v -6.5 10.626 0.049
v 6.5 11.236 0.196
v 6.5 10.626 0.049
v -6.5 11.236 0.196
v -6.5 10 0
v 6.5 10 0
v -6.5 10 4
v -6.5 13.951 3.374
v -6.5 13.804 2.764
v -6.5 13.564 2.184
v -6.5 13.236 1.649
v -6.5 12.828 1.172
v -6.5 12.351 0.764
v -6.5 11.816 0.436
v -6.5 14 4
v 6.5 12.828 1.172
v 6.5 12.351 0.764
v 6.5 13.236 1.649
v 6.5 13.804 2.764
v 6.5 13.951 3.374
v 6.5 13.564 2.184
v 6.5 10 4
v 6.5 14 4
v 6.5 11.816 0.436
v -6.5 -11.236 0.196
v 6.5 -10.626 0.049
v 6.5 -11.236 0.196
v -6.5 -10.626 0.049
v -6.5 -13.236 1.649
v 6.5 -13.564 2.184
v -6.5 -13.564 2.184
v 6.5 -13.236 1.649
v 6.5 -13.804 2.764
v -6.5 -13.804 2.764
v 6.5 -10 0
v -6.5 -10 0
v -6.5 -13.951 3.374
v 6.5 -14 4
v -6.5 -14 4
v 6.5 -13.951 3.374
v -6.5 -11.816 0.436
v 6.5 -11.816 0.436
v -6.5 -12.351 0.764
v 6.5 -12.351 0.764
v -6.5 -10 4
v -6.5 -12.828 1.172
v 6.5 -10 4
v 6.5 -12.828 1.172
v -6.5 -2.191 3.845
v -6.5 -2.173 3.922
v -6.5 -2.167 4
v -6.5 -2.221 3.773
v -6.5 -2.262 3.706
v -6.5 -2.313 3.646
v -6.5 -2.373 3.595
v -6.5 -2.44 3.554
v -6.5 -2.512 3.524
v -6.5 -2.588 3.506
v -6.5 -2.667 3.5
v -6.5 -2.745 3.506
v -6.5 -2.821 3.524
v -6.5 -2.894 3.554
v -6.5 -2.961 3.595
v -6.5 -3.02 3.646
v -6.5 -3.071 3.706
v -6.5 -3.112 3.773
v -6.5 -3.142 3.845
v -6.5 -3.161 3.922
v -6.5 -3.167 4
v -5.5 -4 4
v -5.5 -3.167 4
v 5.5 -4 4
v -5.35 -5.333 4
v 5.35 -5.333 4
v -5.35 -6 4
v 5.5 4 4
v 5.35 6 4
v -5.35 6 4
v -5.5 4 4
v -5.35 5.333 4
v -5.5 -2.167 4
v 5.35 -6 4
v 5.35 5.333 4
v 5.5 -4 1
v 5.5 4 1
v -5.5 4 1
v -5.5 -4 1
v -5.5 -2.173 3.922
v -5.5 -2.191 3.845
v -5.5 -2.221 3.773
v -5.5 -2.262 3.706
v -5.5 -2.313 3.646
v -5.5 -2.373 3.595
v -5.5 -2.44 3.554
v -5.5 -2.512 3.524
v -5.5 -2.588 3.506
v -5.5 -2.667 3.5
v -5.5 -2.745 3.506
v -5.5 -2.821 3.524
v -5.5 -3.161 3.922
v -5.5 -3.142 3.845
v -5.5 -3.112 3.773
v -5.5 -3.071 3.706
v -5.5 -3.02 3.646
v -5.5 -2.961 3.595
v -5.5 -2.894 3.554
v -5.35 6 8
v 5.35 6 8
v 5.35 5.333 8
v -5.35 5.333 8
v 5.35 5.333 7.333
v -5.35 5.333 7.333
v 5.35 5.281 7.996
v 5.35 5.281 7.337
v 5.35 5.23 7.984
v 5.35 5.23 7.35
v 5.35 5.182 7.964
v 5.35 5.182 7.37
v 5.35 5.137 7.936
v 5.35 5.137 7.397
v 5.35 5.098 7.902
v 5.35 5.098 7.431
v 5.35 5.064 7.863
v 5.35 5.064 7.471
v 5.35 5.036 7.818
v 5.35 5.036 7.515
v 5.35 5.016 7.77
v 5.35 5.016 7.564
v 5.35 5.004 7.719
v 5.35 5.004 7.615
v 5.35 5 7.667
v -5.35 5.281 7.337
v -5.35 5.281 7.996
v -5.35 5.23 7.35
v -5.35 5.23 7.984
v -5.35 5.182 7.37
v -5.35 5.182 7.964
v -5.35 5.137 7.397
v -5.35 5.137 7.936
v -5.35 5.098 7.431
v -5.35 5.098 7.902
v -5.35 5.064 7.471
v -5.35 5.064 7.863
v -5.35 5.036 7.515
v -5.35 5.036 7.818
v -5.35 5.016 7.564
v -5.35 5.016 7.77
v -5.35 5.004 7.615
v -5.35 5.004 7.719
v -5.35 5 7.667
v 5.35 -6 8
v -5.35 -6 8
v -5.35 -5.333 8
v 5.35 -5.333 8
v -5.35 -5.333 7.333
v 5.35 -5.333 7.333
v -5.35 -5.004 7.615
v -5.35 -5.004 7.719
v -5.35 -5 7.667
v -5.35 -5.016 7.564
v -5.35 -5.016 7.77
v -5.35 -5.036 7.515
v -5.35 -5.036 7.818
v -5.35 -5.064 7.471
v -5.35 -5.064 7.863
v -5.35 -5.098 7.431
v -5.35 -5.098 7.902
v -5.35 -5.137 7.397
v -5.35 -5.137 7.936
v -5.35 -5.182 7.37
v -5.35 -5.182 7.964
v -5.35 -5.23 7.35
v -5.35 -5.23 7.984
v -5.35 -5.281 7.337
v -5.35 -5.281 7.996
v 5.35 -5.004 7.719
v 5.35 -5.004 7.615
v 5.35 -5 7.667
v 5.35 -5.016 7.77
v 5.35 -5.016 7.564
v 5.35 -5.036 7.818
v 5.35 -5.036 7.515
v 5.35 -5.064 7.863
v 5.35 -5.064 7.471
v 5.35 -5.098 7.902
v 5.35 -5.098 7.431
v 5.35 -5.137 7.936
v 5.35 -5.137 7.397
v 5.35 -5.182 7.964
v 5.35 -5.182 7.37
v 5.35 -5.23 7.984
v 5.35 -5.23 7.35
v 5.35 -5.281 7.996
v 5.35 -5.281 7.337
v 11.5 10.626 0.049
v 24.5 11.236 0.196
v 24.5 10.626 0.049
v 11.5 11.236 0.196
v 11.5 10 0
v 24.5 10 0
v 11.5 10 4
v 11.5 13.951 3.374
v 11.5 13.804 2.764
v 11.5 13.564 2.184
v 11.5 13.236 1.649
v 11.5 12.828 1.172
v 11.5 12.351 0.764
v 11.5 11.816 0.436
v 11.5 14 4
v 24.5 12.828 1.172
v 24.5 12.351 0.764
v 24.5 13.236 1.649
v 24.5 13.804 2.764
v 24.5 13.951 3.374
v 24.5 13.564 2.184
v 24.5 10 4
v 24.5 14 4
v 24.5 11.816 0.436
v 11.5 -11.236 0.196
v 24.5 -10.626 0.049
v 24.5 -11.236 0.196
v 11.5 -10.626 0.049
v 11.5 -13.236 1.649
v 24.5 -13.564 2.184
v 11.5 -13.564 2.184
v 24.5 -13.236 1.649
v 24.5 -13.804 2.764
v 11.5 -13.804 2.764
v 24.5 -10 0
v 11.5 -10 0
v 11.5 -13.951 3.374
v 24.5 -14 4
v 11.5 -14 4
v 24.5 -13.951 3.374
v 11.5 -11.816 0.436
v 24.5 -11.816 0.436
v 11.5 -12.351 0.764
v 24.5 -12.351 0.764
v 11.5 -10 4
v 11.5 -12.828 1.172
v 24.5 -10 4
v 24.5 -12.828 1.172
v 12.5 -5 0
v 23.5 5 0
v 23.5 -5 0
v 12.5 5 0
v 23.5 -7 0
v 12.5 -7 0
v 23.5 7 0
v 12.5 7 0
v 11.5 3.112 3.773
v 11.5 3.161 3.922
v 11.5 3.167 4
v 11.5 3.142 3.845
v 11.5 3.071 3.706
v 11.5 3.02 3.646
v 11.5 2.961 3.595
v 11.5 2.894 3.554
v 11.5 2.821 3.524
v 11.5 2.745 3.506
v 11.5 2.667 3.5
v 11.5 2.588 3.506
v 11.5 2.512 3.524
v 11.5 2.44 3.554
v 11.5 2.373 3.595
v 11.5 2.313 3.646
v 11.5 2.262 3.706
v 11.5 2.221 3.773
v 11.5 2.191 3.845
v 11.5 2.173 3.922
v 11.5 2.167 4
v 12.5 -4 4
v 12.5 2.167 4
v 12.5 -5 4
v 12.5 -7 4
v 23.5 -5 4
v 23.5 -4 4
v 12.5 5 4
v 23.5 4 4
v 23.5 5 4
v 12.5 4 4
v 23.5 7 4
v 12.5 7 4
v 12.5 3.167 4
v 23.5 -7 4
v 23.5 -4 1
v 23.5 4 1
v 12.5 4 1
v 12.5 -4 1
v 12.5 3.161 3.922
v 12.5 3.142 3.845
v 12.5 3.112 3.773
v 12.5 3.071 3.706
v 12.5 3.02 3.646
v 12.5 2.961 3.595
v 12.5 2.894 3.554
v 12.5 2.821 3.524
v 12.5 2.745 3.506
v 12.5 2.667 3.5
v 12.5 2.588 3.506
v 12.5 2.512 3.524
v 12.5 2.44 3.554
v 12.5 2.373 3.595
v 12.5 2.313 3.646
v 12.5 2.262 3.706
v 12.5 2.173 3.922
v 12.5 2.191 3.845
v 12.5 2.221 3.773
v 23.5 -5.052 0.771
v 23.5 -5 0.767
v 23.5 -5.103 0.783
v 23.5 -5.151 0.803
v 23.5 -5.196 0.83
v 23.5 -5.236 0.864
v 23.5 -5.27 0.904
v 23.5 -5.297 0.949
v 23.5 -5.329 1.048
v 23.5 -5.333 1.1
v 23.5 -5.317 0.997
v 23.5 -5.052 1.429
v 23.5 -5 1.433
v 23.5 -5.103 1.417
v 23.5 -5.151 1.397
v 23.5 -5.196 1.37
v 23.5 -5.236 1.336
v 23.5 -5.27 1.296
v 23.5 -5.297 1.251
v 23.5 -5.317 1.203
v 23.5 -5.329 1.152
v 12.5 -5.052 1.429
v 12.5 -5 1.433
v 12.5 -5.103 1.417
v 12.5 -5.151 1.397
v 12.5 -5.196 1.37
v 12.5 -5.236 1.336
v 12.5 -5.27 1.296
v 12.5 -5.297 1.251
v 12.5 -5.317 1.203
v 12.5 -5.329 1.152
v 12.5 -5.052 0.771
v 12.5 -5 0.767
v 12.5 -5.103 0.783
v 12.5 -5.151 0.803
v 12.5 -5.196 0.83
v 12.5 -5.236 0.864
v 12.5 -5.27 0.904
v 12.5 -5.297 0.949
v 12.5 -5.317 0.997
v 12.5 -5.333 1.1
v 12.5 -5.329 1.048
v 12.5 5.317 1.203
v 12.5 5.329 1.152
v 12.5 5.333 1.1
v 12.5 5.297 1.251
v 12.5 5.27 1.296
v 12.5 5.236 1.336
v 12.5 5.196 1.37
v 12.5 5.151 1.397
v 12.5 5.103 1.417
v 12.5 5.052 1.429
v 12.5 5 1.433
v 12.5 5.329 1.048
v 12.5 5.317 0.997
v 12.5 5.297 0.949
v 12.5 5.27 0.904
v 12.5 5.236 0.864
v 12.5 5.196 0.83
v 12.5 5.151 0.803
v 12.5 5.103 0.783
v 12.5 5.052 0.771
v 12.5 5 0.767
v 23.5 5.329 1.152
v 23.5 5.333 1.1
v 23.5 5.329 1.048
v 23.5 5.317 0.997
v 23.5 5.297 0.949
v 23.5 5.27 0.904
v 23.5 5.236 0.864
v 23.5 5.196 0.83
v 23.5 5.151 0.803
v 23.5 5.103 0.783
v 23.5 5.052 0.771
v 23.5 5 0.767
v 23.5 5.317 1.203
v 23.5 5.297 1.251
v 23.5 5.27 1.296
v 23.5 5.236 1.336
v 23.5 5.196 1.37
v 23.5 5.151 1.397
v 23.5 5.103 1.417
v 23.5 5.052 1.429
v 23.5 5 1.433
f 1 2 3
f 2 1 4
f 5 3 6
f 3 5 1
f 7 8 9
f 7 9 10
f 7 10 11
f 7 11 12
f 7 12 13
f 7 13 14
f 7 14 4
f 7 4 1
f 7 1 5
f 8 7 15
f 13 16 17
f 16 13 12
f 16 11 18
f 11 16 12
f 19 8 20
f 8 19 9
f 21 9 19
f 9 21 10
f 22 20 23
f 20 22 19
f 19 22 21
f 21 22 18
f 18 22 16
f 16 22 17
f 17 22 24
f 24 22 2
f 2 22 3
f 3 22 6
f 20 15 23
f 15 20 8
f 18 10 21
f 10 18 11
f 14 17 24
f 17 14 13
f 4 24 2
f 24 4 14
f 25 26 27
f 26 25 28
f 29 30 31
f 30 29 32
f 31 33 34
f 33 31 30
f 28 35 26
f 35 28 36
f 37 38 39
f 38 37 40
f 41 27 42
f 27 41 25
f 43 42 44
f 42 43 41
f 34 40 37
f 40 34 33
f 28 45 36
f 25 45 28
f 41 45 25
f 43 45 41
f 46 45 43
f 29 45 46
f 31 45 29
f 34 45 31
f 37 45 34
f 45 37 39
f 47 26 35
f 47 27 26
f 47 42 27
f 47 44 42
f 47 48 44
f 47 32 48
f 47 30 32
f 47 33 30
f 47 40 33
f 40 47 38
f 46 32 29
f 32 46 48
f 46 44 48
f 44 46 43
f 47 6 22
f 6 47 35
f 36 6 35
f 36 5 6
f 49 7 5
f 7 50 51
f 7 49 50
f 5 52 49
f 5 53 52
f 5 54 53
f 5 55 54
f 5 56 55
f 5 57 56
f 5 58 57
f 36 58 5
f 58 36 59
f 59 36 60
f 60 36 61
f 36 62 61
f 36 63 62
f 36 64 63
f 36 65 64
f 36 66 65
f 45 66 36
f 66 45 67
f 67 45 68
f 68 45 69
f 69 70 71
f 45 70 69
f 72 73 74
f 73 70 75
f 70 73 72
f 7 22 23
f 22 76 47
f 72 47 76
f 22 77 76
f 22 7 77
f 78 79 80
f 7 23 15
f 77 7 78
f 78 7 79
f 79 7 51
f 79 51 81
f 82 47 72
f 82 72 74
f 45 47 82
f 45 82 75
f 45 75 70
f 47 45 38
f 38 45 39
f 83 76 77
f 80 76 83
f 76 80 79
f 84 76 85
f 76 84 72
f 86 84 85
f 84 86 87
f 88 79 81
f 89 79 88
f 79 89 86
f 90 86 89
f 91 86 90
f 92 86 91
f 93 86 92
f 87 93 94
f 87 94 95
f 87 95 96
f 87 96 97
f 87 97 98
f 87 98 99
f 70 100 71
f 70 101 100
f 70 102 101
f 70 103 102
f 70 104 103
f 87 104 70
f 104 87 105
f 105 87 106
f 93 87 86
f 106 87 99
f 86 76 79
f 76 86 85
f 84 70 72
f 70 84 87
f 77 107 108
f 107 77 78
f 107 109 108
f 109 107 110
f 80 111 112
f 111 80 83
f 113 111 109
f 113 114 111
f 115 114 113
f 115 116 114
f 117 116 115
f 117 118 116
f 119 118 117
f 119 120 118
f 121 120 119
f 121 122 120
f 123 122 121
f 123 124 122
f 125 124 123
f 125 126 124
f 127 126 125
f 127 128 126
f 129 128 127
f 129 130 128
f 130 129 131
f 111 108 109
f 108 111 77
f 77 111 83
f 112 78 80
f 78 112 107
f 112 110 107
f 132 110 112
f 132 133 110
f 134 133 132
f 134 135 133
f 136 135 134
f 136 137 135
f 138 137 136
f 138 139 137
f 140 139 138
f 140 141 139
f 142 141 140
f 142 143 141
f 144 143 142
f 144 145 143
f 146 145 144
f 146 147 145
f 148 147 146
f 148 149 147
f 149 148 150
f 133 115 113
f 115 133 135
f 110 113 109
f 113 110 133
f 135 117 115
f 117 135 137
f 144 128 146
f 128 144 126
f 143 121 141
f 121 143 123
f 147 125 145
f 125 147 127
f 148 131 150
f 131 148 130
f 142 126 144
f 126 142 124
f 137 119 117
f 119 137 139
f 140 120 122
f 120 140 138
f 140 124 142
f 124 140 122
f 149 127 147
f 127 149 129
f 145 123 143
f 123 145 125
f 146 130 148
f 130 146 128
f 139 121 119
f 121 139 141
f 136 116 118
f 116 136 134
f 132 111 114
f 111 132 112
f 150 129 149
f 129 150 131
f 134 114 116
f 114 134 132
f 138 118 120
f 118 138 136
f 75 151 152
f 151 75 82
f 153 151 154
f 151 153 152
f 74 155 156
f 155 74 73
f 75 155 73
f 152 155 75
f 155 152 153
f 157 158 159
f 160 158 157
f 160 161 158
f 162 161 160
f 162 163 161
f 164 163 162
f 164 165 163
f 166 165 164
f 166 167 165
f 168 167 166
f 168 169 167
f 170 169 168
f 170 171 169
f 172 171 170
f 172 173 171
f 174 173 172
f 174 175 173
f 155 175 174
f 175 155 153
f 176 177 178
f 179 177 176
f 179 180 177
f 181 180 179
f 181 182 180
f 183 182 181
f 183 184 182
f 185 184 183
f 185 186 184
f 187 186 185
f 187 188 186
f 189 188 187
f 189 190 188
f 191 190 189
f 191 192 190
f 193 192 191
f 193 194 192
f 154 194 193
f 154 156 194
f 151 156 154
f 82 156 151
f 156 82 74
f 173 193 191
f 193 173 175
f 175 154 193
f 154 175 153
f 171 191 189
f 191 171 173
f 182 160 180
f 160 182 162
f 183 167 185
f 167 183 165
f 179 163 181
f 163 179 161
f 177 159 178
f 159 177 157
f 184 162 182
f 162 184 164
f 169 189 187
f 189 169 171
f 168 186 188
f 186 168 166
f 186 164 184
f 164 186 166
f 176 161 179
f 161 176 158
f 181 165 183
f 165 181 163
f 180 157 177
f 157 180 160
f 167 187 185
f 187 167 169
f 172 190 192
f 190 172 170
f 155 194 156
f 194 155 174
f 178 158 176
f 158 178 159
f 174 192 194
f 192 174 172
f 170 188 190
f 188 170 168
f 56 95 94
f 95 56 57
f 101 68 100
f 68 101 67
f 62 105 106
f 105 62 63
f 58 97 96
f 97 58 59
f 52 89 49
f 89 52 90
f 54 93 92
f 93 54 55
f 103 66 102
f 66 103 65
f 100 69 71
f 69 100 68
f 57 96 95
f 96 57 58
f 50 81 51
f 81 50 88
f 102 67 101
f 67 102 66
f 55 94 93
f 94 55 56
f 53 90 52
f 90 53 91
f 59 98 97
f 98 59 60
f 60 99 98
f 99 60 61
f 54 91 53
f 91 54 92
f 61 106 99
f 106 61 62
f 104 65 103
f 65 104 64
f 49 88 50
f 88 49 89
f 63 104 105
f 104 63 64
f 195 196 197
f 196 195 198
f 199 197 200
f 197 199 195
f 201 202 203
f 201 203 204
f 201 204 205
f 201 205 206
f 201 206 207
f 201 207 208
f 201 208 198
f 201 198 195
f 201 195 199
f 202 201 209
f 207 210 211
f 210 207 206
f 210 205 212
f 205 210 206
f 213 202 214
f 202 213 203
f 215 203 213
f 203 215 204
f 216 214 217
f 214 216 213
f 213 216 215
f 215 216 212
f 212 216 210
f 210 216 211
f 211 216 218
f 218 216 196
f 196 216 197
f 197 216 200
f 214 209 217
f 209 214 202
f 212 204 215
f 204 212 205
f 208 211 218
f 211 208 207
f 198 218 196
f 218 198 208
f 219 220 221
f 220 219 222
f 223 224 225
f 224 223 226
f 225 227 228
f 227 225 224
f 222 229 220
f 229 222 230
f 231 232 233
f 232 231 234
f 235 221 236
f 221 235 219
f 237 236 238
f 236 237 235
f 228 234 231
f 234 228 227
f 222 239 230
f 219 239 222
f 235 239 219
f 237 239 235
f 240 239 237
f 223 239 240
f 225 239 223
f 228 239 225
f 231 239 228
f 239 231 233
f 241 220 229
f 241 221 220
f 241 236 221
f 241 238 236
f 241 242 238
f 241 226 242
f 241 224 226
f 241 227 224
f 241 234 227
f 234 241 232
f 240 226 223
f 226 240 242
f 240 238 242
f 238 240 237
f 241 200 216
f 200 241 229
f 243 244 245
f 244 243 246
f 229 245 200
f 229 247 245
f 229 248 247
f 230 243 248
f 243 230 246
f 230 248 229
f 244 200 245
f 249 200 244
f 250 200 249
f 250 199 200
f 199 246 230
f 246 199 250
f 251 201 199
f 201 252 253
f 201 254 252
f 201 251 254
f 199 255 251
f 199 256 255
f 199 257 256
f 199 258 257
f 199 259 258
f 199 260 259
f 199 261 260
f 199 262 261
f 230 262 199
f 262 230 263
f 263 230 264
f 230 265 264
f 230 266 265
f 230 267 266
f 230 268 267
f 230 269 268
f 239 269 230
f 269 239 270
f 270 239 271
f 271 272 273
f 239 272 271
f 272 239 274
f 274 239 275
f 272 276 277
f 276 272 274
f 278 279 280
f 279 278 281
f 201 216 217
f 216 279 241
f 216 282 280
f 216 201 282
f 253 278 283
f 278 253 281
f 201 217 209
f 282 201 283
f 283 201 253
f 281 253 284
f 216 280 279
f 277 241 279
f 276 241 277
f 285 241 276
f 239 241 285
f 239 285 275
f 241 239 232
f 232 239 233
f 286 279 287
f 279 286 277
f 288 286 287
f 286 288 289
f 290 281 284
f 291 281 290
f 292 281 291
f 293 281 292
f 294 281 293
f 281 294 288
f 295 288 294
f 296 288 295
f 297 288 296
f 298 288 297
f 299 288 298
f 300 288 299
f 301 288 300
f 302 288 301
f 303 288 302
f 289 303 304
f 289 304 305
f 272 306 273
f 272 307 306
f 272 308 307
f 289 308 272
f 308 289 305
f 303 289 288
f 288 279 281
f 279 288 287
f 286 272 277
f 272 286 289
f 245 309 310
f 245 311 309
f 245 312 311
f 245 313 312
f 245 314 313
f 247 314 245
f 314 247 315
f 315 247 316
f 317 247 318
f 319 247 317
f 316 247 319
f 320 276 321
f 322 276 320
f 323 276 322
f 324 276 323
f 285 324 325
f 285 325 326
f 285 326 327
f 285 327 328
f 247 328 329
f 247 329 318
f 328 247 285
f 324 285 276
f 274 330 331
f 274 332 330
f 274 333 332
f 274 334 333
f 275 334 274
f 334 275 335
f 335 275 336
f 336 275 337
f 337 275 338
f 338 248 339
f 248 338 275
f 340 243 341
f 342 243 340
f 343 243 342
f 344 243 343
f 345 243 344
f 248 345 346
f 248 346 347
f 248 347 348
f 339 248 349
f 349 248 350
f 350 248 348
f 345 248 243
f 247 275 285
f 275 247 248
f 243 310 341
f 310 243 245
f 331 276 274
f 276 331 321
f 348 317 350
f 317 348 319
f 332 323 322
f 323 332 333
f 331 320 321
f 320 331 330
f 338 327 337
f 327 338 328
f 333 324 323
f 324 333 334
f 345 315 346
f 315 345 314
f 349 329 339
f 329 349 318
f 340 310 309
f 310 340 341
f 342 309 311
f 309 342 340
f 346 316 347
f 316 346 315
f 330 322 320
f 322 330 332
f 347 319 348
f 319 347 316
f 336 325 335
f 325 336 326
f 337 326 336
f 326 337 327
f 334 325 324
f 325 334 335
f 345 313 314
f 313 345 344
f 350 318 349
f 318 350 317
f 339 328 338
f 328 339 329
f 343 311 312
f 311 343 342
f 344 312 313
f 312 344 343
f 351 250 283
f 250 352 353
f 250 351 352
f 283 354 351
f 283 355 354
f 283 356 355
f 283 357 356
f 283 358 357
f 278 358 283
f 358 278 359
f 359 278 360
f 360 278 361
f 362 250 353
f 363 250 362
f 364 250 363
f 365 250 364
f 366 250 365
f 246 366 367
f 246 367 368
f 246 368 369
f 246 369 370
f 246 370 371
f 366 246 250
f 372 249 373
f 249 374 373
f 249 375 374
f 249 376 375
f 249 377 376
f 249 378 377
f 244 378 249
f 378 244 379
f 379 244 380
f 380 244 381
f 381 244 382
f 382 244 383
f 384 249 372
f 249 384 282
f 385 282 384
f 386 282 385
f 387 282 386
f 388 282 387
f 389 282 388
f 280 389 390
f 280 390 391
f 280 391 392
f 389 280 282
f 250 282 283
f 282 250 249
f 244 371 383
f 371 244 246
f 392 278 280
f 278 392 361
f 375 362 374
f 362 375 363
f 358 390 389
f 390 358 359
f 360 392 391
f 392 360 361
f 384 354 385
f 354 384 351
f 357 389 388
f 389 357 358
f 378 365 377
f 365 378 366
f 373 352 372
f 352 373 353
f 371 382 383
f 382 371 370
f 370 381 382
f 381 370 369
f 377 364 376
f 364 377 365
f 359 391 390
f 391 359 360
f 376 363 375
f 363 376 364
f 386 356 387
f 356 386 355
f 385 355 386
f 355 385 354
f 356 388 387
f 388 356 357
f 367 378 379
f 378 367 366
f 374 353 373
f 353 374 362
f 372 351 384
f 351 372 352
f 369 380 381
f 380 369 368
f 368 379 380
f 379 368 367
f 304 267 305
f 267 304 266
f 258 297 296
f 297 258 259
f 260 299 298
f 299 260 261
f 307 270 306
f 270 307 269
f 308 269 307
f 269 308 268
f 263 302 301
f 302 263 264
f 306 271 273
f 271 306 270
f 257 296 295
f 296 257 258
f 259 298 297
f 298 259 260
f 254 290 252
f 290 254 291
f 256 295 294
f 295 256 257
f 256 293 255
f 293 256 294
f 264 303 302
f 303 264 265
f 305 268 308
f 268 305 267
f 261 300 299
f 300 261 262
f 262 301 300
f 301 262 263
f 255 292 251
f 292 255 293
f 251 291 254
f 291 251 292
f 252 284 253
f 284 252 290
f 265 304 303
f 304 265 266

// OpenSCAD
//alles in mm
//spezifikationen des Bauteils
r_durchmesser = 5;
r_laenge = 10;
r_kasten_breite = 2;

Kabel_durchmesser = 1;


// Wandstärken 
wand_laenge = 1; //mindestens 1
b_ueberlappung = 3; //ueberlappung mit Stoff + ges_hoehe/2 mindestens 1
wand_breite = 1; //mindestens 1
wand_hoehe = 1; //mindestens 1

//offsets
clipper = 2; //mindestens/empfohlen 2

clipper_offset = 0.3;//reibungsvermeidung (innenteil kleiner)

stoff_spielraum = 0.1;// Spielraum der clipper um die stoffdicke zu kompensieren

clipper_staerke = clipper/3;
//diese offsets sind fuer zusaetzlichen platz im innenraum

off_breite = 0.5; //empfohlen groeßer 0,25
off_laenge = 0.5; //empfohlen groeßer 0,25
off_hoehe = 0.5; //empfohlen groeßer 0,25

//errechnete groeßen
bauteil_breite = r_durchmesser + r_kasten_breite;

//gesamtmaße des Quaders ohne runde Ecken
ges_laenge = r_laenge + 2*wand_laenge + 2*off_laenge;

ges_breite = 2*b_ueberlappung + 2*clipper + 2*wand_breite+bauteil_breite + 2 * off_laenge;

ges_hoehe = 2*wand_hoehe + r_durchmesser+2*off_hoehe;

//maße des inneren quaders
in_breite = bauteil_breite + 2 *off_breite;
in_laenge = r_laenge +2*off_laenge;
in_hoehe = r_durchmesser+2*off_hoehe;


//halbgrößen
h_halb = ges_hoehe/2;
l_halb = ges_laenge/2;
b_halb = ges_breite/2;

h_in_halb = in_hoehe/2;
l_in_halb = in_laenge/2;
b_in_halb = in_breite/2;

complete();


module complete()
{

    translate([0,0,h_halb])
    {
        lowerhalf();
    }

    translate([ges_laenge + 5  ,0,h_halb])
    {
        upperhalf();
    }
}

module test()
{
    difference()
    {
        union()
        {
            rotate([0,180,180])
            {
                upperhalf();

            }
            lowerhalf();
            }  
        translate([-l_halb,0,0])
        {
        cube([ges_laenge,ges_breite+ges_hoehe+1,ges_hoehe+1],center=true); 
        }
    }
}
 
module lowerhalf()
{
    difference(){
    union()
    {
        half();
        translate([0,b_in_halb+wand_breite+h_halb/12,0])
        {
            translate([-(in_laenge-clipper_offset)/2,0,h_halb])
            {
                rotate([0,180,-90])
                {
                    union()
                    {
                        cube([clipper_staerke,in_laenge-clipper_offset,h_halb]);
                        translate([0,0,h_halb/12])
                        {
                            rotate([-90,90,0])
                            {  
                                cylinder(h = in_laenge-clipper_offset,d = h_halb/6,$fn=40);
                            }
                        }
                    }
                    
                }
            }
        }
        translate([0,-b_in_halb-wand_breite-h_halb/12,0])
        {
            translate([(in_laenge-clipper_offset)/2,0,h_halb])
            {
                rotate([0,180,90])
                {
                    union()
                    {
                        cube([clipper_staerke,in_laenge-clipper_offset,h_halb]);
                        translate([0,0,h_halb/12])
                        {
                            rotate([-90,90,0])
                            {  
                                cylinder(h = in_laenge-clipper_offset,d = h_halb/6,$fn=40);
                            }
                        }
                    }
                    
                }
            }
        }
    } 
    translate([-l_in_halb-wand_laenge/2,-in_breite/3,0])
        {
            rotate([0,90,0])
            {    
            
                cylinder(h = wand_laenge * 2  ,r = Kabel_durchmesser/2,$fn=40,center=               true);
            
            
            } 
        } 
}}    


module upperhalf()
{
    difference()
    {
        half();
        
        
        translate([-l_in_halb,clipper/2,0])//zentrierung
        {
            translate([0,-clipper/2-b_in_halb-wand_breite,0])//verschiebung
            {   
                rotate([180,0,0])
                {
                    difference()
                    {
                        cube([in_laenge,clipper,h_halb+0.0001]);//flickervermeidung
                        translate([0,0,2*h_halb/3+h_halb/12-stoff_spielraum])
                        {
                            rotate([0,90,0])
                            {  
                                cylinder(h = in_laenge,d = h_halb/6,$fn=40);
                            }
                        }
                    }
                }
            }   
       
        }
        
        
        translate([l_in_halb,-clipper/2,0])//zentrierung
        {
            translate([0,clipper/2+b_in_halb+wand_breite,0])//verschiebung
            {   
                rotate([180,0,180])
                {
                    difference()
                    {
                        cube([in_laenge,clipper,h_halb+0.0001]);//flickervermeidung
                        translate([0,0,2*h_halb/3+h_halb/12-stoff_spielraum])
                        {
                            rotate([0,90,0])
                            {  
                                cylinder(h = in_laenge,d = h_halb/6,$fn=40);
                            }
                        }
                    }
                }
            }   
       
        }
      translate([-l_in_halb-wand_laenge/2,in_breite/3,0])
        {
            rotate([0,90,0])
            {    
            
                cylinder(h = wand_laenge * 2  ,r = Kabel_durchmesser/2,$fn=40,center=               true);
            
            
            } 
        }   
    }   
    
}


module half()
{
    difference()
    {
        body();
        //halbierung
        translate([-l_halb,-b_halb-h_halb,0])
        {
            cube([ges_laenge,ges_breite+2*h_halb,ges_hoehe]);
        }
        //innenraum
        translate([-l_in_halb,-b_in_halb,-h_in_halb])
        {
    
            cube([in_laenge,in_breite,in_hoehe]);
       
        }
        
  
        
    }    
}

module body() 
{
    union()
    {
        cube([ges_laenge,ges_breite,ges_hoehe], center = true);
        rotate([0,90,0])
        {    
            translate([0,b_halb,0])
            {
                cylinder(h = ges_laenge-0.0001,r = h_halb,$fn=40,center=true);
            }
            translate([0,-b_halb,0])
            {
                cylinder(h = ges_laenge-0.0001,r = h_halb,$fn=40,center=true);
            }
            //-0,000001 um artefakte zu verhindern
        }   
    }
}
